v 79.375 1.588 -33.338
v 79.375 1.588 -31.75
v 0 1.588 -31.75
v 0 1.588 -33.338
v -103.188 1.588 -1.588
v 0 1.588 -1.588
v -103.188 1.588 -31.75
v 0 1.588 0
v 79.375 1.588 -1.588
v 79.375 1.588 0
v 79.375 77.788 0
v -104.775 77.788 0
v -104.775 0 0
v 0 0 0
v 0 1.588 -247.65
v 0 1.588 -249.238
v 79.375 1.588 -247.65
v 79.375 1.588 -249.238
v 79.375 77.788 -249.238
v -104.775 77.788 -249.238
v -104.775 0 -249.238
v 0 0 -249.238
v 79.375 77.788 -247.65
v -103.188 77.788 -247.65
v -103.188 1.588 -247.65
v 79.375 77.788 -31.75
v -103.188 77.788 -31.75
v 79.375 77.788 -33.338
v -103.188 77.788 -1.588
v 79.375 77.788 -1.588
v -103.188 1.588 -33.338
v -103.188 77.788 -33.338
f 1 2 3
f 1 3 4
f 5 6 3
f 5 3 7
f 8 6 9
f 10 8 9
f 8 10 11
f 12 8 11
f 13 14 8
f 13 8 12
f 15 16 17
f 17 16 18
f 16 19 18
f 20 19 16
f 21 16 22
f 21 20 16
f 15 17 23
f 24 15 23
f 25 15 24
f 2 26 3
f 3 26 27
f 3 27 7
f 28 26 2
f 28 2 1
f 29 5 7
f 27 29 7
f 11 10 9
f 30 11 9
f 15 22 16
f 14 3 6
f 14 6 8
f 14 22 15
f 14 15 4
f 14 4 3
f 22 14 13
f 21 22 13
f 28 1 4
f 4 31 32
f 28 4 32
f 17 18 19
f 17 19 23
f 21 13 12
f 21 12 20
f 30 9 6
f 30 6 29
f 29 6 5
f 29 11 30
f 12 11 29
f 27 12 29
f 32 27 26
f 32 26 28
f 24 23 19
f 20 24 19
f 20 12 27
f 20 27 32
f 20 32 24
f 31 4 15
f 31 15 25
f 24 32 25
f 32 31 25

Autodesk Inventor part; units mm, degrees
ref_plane "YZ Plane" through (0, 0, 0) normal (1, 0, 0) x (0, 1, 0)
ref_plane "XZ Plane" through (0, 0, 0) normal (0, 1, 0) x (-1, 0, 0)
ref_plane "XY Plane" through (0, 0, 0) normal (0, 0, 1) x (1, 0, 0)
sketch "Sketch1" plane through (0, 0, 0) normal (0, 1, 0) x (-1, 0, 0)
  point P0 (0, 0)
sketch "Sketch2" plane through (0, 0, 0) normal (0, 1, 0) x (-1, 0, 0)
  line L0 (0, 0) -> (104.775, 0)
  line L1 (104.775, 0) -> (104.775, -249.2375)
  line L2 (104.775, -249.2375) -> (0, -249.2375)
  line L3 (0, -249.2375) -> (0, 0)
  dimension "d0" = 104.775
  dimension "d1" = 249.2375
extrude "Extrusion1" add sketch "Sketch2" along normal blind 1.5875
sketch "Sketch3" plane through (0, 1.5875, 0) normal (0, 1, 0) x (1, 0, 0)
  line L0 (-104.775, 0) -> (0, 0) projected
  line L1 (-104.775, 0) -> (-103.1875, 0)
  line L2 (-103.1875, 0) -> (-103.1875, 304.8)
  line L3 (-104.775, 304.8) -> (-104.775, 0)
  line L4 (-104.775, 249.2375) -> (-104.775, 0) projected
  line L5 (-104.775, 0) -> (79.375, 0)
  line L6 (79.375, 0) -> (79.375, 1.5875)
  line L7 (79.375, 1.5875) -> (-104.775, 1.5875)
  line L8 (-104.775, 1.5875) -> (-104.775, 0)
  line L9 (0, 249.2375) -> (-104.775, 249.2375) projected
  line L10 (-104.775, 249.2375) -> (79.375, 249.2375)
  line L11 (79.375, 249.2375) -> (79.375, 247.65)
  line L12 (79.375, 247.65) -> (-104.775, 247.65)
  line L13 (-104.775, 247.65) -> (-104.775, 249.2375)
  line L14 (-104.775, 304.8) -> (-103.1875, 304.8)
  line L15 (-103.1875, 304.8) -> (-103.1875, 0)
  line L16 (-103.1875, 0) -> (-104.775, 0)
  line L17 (-104.775, 0) -> (-104.775, 304.8)
  dimension "d6" = 184.15
  dimension "d7" = 1.5875
  dimension "d8" = 184.15
  dimension "d9" = 1.5875
  dimension "d10" = 1.5875
  dimension "d11" = 304.8
extrude "Extrusion2" add sketch "Sketch3" along normal blind 76.2
sketch "Sketch4" plane through (-103.1875, 1.5875, -1.5875) normal (1, 0, 0) x (0, 0, -1)
  line L0 (-1.5875, -1.5875) -> (-1.5875, 0) construction
  line L1 (-1.5875, -1.5875) -> (30.1625, -1.5875) construction
  line L2 (247.65, -1.5875) -> (-1.5875, -1.5875) construction
  line L3 (30.1625, -1.5875) -> (30.1625, 0) construction
  line L4 (0, 0) -> (246.0625, 0) construction
  line L5 (0, 76.2) -> (246.0625, 76.2) projected
  line L6 (30.1625, 0) -> (31.75, 0)
  line L7 (31.75, 0) -> (31.75, 76.2)
  line L8 (31.75, 76.2) -> (30.1625, 76.2)
  line L9 (30.1625, 76.2) -> (30.1625, 0)
  dimension "d14" = 31.75
  dimension "d15" = 1.5875
extrude "Extrusion3" add sketch "Sketch4" along normal blind 182.5625
sketch "Sketch5" plane through (-104.775, 0, -249.2375) normal (-1, 0, 0) x (0, 0, 1)
  line L0 (-55.5625, 1.5875) -> (-55.5625, 77.7875) projected
  line L1 (0, 0) -> (0, 1.5875) projected
  line L2 (-55.5625, 77.7875) -> (0, 77.7875)
  line L3 (0, 77.7875) -> (0, 1.5875)
  line L4 (0, 1.5875) -> (-55.5625, 1.5875)
  line L5 (-55.5625, 1.5875) -> (-55.5625, 77.7875)
  point P0 (249.2375, 0)
extrude "Extrusion4" cut sketch "Sketch5" against normal blind 50.8
sketch "Sketch6" plane through (-104.775, 0, 0) normal (0, 0, 1) x (1, 0, 0)
  line L0 (184.15, 1.5875) -> (104.775, 1.5875) construction
  line L1 (106.3548, 1.5875) -> (106.3548, 49.2125) construction
  line L2 (106.3548, 1.5875) -> (153.9798, 1.5875) construction
  line L3 (184.15, 56.388) -> (92.075, 56.388) construction
  line L4 (92.075, 56.388) -> (92.075, 40.3233) construction
  circle A0 centre (92.075, 49.2125) radius 1.905 construction
  point P0 (104.775, 0)
  dimension "d20" = 47.625
  dimension "d21" = 90
  dimension "d22" = 92.075
  dimension "d23" = 3.81
properties part number "Collector Base"
